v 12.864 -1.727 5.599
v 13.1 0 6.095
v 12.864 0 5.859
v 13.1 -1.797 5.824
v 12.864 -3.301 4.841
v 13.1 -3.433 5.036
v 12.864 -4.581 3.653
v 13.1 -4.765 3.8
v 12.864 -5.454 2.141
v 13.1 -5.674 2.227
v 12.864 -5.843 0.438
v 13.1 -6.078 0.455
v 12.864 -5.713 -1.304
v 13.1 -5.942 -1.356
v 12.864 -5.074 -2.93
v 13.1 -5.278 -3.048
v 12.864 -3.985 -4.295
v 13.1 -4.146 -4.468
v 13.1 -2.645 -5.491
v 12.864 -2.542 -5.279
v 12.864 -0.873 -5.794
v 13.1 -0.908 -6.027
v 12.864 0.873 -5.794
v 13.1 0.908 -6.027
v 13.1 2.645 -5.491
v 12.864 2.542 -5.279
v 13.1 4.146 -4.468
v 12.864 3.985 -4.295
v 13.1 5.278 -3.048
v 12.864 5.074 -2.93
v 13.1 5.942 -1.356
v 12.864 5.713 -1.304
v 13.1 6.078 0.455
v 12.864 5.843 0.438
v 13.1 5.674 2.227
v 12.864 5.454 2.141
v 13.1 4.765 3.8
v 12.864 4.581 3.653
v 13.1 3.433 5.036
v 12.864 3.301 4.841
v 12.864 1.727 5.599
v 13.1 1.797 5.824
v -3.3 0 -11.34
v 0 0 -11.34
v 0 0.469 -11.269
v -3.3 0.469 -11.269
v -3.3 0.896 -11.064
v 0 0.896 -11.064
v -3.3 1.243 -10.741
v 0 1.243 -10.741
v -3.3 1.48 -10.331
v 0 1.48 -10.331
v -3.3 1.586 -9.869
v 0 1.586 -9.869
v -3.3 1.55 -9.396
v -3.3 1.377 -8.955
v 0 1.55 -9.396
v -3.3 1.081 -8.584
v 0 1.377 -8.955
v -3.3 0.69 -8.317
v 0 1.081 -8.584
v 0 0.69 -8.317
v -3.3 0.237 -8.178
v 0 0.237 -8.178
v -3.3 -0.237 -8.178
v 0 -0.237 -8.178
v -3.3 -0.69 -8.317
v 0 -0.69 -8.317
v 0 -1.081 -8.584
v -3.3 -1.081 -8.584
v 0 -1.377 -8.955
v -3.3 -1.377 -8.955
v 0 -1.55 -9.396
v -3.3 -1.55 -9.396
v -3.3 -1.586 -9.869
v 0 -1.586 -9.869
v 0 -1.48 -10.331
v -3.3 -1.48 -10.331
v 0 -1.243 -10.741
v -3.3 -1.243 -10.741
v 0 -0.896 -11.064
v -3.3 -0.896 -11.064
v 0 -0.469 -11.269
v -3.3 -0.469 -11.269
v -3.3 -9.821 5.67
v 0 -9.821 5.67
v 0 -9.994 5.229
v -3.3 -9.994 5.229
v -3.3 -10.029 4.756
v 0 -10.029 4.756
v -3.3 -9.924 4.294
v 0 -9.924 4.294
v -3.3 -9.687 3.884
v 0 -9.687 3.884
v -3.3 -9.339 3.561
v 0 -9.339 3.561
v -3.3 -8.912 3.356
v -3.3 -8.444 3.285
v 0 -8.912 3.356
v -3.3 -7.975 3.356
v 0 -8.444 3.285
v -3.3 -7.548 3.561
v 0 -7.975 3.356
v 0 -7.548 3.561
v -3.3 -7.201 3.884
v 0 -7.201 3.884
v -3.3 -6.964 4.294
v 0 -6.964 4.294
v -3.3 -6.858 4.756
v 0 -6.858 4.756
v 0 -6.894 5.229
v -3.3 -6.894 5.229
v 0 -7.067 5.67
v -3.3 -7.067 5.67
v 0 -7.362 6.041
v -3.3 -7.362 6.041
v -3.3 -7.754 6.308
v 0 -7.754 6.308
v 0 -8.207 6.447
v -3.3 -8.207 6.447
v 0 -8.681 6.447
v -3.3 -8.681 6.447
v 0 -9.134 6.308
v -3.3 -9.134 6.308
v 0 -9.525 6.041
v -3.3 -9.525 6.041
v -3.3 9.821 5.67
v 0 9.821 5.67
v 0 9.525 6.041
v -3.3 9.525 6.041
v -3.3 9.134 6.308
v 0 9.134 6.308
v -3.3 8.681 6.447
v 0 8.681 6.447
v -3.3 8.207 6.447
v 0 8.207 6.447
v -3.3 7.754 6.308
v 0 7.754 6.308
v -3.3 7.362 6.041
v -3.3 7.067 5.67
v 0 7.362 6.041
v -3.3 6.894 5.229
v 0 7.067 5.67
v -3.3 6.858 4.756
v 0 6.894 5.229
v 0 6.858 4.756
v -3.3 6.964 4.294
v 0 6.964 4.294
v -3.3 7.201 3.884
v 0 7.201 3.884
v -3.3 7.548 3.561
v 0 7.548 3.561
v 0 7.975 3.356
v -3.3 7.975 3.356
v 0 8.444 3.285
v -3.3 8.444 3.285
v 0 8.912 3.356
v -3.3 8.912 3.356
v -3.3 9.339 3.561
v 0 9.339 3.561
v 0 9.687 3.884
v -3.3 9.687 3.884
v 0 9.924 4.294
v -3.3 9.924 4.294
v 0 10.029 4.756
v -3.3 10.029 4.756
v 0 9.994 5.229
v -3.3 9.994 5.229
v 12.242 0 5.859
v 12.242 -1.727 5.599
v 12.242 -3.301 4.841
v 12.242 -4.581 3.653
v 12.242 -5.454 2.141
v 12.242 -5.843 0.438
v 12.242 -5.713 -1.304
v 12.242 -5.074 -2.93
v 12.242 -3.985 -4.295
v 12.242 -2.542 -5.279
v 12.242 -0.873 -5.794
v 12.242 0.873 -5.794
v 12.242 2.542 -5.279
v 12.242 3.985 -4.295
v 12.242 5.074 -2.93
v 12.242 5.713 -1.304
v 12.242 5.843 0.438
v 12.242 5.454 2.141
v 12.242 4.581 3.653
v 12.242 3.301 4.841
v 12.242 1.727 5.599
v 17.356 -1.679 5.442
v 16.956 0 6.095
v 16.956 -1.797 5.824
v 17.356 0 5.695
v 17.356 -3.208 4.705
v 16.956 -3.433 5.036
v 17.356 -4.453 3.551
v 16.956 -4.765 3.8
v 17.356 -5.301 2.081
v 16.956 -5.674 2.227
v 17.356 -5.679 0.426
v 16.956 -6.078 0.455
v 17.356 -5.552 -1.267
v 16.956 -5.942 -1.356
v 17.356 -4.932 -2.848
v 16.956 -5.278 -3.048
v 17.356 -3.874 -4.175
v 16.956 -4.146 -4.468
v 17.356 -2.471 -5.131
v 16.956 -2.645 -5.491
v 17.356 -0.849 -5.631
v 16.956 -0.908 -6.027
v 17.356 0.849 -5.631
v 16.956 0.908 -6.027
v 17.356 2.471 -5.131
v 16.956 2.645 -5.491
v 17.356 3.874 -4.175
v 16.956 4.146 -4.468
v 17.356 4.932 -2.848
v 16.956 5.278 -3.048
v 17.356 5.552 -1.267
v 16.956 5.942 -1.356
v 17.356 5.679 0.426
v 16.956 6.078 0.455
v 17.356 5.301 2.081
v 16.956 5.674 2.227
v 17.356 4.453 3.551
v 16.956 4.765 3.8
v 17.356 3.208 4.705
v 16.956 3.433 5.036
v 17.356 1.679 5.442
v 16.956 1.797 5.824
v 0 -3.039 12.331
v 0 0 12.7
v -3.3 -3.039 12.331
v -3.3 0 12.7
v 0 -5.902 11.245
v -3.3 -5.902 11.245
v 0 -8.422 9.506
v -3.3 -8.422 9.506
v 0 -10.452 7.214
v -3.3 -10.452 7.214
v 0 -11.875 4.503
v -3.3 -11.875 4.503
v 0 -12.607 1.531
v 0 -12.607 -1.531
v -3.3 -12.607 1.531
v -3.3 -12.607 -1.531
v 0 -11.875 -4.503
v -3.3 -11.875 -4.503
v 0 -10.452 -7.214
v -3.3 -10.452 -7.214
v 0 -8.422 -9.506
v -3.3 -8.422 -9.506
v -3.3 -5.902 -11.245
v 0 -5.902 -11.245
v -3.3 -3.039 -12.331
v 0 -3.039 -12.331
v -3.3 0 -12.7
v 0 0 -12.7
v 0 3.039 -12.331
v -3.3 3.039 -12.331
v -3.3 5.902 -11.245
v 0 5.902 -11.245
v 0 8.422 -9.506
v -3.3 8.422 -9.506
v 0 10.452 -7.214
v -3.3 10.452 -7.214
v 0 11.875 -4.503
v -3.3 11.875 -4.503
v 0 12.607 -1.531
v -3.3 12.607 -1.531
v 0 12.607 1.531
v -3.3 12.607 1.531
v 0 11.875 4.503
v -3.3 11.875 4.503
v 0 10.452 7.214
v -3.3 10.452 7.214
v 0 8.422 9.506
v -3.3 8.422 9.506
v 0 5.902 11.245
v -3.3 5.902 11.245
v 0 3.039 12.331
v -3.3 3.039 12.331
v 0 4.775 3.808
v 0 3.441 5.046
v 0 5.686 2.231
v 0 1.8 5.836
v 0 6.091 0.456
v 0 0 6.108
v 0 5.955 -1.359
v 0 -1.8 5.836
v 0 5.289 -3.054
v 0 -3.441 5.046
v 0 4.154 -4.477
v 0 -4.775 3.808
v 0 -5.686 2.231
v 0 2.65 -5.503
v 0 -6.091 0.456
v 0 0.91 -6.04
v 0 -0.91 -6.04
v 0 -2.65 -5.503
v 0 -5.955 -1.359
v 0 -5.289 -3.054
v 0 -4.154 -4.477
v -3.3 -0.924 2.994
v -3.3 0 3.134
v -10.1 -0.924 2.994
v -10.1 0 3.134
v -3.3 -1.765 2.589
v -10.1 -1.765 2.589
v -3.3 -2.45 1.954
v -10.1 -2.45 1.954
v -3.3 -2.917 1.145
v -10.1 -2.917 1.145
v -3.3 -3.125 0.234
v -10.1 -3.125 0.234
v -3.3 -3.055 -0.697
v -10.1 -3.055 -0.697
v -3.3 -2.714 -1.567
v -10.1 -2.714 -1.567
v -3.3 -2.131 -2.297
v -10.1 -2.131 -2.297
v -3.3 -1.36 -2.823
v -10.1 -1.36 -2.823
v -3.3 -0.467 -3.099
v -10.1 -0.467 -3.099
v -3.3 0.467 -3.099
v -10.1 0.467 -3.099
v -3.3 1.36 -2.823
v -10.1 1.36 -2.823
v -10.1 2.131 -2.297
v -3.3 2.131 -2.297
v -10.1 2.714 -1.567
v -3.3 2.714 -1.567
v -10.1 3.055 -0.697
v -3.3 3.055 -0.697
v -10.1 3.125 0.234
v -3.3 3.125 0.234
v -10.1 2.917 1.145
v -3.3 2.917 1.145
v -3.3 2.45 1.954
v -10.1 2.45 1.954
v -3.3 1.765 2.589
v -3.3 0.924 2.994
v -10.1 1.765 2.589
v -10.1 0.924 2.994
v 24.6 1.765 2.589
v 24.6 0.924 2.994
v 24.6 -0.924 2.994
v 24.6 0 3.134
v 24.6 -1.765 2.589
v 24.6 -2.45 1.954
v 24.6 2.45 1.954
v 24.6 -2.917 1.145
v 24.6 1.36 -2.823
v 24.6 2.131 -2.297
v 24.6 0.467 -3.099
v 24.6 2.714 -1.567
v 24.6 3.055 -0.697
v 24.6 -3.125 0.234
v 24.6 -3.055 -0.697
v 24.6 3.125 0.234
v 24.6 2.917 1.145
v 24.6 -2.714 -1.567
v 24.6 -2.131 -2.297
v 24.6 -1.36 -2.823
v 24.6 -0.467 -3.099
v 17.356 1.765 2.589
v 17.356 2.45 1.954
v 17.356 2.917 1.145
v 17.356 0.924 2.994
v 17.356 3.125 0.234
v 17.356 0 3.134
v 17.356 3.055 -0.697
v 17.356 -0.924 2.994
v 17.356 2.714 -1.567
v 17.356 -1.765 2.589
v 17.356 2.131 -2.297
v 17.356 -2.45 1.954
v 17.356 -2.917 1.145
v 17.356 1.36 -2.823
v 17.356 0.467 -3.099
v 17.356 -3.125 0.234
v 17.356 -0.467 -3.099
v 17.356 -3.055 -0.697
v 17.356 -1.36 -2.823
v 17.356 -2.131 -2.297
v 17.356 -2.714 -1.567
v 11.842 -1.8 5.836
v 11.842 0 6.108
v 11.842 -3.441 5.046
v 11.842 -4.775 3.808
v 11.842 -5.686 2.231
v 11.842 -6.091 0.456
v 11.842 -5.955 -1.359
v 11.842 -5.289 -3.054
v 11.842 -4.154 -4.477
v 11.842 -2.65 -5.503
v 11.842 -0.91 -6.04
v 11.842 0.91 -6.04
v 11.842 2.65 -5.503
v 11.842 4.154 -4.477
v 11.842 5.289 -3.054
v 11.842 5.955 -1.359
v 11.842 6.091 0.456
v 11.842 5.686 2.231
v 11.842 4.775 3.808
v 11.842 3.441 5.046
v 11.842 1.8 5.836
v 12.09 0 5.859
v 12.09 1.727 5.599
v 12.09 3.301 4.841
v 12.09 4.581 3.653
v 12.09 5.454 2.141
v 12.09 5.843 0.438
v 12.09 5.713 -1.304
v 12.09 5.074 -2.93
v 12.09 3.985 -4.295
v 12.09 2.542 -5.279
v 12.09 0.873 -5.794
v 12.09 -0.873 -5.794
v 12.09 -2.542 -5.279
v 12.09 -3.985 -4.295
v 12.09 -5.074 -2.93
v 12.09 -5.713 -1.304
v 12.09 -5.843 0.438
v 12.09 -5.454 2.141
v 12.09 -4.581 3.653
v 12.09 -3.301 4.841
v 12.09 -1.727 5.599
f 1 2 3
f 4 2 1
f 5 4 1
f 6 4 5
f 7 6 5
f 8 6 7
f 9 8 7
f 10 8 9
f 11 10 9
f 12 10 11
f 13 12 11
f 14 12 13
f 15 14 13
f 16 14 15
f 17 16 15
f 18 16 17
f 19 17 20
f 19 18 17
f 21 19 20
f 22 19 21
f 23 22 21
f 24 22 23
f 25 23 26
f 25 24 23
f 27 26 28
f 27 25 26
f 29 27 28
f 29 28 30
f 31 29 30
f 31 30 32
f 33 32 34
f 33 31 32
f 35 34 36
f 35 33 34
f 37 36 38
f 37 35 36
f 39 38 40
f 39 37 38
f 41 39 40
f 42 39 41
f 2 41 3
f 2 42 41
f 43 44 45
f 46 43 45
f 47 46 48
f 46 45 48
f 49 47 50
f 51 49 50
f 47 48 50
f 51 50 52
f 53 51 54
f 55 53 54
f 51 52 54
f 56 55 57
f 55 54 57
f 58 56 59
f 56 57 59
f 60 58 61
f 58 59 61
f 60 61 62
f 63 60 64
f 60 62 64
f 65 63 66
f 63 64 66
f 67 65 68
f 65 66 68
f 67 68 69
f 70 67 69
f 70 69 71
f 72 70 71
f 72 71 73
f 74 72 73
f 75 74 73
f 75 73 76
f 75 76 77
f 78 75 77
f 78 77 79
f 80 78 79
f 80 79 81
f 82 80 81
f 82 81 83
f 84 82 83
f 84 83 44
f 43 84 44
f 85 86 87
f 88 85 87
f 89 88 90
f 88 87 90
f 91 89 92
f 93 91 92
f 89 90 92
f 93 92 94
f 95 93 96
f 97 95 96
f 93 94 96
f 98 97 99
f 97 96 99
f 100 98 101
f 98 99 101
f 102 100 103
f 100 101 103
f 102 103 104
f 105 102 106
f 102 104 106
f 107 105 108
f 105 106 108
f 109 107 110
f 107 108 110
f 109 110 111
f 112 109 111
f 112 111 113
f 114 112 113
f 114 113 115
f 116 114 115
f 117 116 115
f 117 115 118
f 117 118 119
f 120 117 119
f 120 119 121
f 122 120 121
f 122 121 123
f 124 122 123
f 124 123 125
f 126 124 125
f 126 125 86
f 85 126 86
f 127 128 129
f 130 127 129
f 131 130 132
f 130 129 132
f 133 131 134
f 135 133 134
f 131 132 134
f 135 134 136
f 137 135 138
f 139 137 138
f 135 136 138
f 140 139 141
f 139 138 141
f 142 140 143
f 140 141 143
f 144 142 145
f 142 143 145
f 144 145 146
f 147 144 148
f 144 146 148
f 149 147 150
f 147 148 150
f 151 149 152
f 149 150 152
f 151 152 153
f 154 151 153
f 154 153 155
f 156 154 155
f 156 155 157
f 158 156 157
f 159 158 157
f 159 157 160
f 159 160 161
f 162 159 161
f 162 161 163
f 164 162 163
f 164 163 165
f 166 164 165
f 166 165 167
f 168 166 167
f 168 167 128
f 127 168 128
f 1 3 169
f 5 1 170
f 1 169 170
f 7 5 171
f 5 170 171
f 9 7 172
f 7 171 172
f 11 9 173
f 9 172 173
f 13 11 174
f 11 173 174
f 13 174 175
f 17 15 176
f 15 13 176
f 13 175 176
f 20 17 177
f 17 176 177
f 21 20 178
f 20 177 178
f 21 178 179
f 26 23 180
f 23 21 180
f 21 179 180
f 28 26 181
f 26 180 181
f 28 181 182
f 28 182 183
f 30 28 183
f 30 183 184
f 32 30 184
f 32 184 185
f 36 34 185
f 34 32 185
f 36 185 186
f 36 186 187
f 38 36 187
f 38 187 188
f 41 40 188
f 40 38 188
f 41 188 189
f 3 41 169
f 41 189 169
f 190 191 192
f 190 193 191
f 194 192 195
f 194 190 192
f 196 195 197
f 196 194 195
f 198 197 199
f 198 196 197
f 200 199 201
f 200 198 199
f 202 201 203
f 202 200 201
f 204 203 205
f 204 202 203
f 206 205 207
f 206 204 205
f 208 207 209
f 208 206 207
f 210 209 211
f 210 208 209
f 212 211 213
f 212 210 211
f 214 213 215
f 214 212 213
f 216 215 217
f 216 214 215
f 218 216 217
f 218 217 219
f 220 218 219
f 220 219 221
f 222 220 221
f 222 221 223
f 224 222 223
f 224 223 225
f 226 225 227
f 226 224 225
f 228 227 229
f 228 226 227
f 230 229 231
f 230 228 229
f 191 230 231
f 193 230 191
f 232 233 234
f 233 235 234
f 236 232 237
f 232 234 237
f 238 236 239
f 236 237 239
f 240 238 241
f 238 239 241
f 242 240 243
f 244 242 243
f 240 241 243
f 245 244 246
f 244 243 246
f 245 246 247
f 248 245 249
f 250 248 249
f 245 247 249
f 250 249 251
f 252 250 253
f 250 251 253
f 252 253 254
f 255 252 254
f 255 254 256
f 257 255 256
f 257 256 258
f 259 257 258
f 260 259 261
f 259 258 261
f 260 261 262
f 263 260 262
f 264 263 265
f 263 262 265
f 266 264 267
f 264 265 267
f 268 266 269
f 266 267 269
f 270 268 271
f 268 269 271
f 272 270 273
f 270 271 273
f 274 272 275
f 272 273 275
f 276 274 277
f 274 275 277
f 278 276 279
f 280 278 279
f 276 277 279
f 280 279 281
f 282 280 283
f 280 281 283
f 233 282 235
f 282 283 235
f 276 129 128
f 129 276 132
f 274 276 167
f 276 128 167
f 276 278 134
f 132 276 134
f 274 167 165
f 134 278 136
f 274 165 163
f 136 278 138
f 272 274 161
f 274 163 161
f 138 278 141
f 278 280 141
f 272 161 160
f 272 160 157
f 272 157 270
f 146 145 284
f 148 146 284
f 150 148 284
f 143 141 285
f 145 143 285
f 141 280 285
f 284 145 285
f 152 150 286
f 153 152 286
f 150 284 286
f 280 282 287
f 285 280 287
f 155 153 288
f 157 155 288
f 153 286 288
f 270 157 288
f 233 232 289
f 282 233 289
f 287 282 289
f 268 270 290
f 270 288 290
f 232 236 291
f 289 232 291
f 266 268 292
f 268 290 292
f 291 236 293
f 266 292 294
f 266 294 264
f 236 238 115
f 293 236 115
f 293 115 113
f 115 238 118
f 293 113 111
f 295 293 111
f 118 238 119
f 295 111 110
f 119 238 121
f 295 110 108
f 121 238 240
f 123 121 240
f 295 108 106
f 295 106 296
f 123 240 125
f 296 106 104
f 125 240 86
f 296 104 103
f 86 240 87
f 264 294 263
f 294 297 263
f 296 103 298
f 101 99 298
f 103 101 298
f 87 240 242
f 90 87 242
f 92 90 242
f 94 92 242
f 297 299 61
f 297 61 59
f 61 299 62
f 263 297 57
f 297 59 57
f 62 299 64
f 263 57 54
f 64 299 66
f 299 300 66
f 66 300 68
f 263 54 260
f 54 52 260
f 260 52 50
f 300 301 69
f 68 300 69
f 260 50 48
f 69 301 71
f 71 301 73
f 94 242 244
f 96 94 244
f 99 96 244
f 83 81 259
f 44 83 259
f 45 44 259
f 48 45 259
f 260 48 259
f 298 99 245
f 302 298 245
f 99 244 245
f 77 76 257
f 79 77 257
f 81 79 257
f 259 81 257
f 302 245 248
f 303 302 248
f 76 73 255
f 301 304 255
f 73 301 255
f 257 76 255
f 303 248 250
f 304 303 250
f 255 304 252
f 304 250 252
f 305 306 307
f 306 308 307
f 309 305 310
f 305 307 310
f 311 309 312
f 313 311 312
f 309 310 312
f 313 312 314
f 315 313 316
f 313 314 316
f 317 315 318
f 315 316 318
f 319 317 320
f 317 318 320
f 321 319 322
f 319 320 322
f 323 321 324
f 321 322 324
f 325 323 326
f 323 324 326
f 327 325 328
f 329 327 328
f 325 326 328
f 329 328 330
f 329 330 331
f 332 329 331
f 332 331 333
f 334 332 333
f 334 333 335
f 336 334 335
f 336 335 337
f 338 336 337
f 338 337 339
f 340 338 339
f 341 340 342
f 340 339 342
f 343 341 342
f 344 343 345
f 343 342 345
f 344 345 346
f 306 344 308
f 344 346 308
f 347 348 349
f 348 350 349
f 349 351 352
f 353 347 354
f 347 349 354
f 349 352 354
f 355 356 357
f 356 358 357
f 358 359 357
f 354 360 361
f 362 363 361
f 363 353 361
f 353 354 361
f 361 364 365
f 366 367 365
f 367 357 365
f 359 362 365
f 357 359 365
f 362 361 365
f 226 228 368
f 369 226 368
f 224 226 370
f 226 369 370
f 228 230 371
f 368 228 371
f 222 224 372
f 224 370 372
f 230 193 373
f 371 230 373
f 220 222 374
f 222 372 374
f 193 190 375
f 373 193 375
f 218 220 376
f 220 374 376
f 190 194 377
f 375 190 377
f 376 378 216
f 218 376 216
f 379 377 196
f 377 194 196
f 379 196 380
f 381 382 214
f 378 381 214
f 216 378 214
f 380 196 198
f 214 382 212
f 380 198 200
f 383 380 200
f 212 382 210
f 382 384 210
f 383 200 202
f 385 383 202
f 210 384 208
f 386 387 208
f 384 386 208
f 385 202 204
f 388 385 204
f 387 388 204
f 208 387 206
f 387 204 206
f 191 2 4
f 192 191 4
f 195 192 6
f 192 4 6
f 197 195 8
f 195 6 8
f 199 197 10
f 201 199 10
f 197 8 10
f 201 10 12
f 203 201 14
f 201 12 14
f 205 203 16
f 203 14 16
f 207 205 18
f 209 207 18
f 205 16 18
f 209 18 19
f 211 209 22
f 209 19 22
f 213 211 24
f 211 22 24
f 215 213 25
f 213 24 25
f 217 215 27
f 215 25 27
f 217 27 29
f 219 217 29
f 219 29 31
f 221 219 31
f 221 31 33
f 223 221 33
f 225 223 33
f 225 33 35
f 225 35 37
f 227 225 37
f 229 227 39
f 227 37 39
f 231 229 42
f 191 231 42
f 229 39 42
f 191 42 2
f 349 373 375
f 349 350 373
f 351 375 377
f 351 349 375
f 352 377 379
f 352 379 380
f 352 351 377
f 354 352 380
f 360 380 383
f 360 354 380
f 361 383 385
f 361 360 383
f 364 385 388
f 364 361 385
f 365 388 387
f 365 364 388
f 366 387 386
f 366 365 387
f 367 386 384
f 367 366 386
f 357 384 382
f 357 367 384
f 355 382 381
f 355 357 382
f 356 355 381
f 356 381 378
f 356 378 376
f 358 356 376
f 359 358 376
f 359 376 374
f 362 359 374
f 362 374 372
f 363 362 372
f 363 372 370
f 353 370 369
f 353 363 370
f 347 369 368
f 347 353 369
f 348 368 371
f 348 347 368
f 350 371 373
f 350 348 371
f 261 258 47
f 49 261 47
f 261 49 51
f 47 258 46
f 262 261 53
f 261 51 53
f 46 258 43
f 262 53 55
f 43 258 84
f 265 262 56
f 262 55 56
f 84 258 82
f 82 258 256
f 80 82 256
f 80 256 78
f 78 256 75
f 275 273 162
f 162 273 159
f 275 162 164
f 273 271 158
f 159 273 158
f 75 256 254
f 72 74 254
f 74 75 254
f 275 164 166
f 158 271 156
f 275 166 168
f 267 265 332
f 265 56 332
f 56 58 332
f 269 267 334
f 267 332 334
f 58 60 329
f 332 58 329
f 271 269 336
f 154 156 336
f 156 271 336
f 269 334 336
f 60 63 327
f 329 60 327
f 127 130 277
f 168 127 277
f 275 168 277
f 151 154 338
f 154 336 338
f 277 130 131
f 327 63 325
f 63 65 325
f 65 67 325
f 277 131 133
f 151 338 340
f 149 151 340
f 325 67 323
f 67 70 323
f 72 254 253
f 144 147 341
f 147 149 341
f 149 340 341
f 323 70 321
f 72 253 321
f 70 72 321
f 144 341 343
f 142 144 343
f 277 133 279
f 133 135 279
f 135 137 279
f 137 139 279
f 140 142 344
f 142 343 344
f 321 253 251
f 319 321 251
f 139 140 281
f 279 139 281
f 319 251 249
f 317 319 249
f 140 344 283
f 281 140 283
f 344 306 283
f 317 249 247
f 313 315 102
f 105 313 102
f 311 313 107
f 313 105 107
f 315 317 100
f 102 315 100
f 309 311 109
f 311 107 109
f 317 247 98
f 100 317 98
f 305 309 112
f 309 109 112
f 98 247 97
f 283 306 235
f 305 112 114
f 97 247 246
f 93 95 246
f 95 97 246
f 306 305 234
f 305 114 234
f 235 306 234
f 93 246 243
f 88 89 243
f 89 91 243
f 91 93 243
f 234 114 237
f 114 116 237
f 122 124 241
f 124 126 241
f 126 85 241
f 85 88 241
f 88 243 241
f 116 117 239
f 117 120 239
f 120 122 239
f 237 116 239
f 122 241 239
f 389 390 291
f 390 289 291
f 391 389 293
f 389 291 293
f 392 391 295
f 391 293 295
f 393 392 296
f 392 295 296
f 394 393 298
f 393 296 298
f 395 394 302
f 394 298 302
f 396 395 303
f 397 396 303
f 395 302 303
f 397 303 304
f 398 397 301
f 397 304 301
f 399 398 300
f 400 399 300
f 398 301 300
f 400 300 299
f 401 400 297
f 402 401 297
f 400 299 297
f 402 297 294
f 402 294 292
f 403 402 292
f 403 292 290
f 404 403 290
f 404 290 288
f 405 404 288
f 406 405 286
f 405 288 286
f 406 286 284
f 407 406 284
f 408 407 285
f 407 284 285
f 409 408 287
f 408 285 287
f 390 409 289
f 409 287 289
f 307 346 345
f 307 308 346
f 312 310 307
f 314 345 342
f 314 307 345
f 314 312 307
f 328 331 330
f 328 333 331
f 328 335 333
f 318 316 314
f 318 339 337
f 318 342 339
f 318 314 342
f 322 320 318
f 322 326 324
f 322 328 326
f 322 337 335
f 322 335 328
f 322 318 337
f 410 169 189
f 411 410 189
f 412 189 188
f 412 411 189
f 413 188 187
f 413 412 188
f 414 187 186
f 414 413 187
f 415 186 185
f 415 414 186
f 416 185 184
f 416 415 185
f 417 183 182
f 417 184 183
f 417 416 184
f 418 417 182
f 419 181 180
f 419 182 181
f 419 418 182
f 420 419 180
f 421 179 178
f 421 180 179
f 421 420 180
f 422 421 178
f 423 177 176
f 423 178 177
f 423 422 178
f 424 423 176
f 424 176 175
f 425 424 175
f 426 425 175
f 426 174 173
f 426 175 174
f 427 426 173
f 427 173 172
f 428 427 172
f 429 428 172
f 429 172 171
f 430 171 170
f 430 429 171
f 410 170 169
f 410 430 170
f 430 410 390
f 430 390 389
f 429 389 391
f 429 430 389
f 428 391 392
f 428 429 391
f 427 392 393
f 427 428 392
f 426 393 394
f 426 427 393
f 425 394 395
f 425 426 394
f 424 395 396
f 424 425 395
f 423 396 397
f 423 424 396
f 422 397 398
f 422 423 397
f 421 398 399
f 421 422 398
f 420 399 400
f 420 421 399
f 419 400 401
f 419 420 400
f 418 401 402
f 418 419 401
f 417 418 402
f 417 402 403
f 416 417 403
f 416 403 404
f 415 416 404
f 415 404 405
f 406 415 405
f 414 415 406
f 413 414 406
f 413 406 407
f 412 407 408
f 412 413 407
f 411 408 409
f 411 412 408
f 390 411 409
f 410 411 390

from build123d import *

# Parameters (mm, degrees)
SKETCH1_W          = 6.8
SKETCH1_H          = 3.133597909
SKETCH1_W_2        = 20.655905863
SKETCH1_W_3        = 7.244094137
SKETCH2_R          = 1.59
CUT_EXTRUDE1_DEPTH = 10
CIRPATTERN1_COUNT  = 3
CHAMFER1_SIZE      = 0.4


with BuildPart() as part:
    # Sketch1 → Revolve1 (revolve)
    with BuildSketch(Plane.XY, mode=Mode.PRIVATE) as revolve1_sk:
        with Locations((-6.7, 1.566798955)):
            Rectangle(SKETCH1_W, SKETCH1_H)
        with Locations((7.027952931, 1.566798955)):
            Rectangle(SKETCH1_W_2, SKETCH1_H)
        Polygon((17.355905863, 3.133597909), (17.355905863, 6.095), (12.7, 6.095), (12.7, 5.859469346), (12.242129105, 5.859469346), (12.242129105, 6.107765985), (0, 6.107765985), (0, 12.7), (-3.3, 12.7), (-3.3, 3.133597909), align=None)
        with Locations((20.977952931, 1.566798955)):
            Rectangle(SKETCH1_W_3, SKETCH1_H)
    revolve(revolve1_sk.sketch.rotate(Axis((-3.3, 0, 0), (1, 0, 0)), 90), axis=Axis((-3.3, 0, 0), (1, 0, 0)))

    # Sketch2 → Cut-Extrude1 (cut)
    with BuildSketch(Plane(origin=(0, 0, 0), x_dir=(0, 0, -1), z_dir=(1, 0, 0))):
        with Locations((9.75, 0)):
            Circle(SKETCH2_R)
    cut_extrude1 = extrude(amount=-CUT_EXTRUDE1_DEPTH, mode=Mode.SUBTRACT)

    # CirPattern1: Cut-Extrude1 ×3 about axis
    cirpattern1_axis = Axis((0, 0, 0), (1, 0, 0))
    for i in range(1, CIRPATTERN1_COUNT):
        add(cut_extrude1.rotate(cirpattern1_axis, i * 360 / CIRPATTERN1_COUNT), mode=Mode.SUBTRACT)

    # Chamfer1
    # the kernel refuses this chamfer: 0.4 mm, written as the material it takes off along each edge
    with BuildSketch(Plane(origin=(17.355905863, 0, 0), x_dir=(0, 0, 1), z_dir=(0, 1, 0))) as chamfer1_piece_1:
        Polygon((6.095, -CHAMFER1_SIZE), (6.095 - CHAMFER1_SIZE, 0), (6.095, 0), align=None)
    revolve(axis=Axis((17.355905863, 0, 0), (1, 0, 0)), mode=Mode.SUBTRACT)
    with BuildSketch(Plane(origin=(12.7, 0, 0), x_dir=(0, 0, 1), z_dir=(0, 1, 0))) as chamfer1_piece_2_section:
        Polygon((6.095 - CHAMFER1_SIZE, 0), (6.095, CHAMFER1_SIZE), (6.095, 0), align=None)
    chamfer1_piece_2 = revolve(axis=Axis((12.7, 0, 0), (1, 0, 0)), mode=Mode.PRIVATE)
    chamfer1_piece_2 = chamfer1_piece_2 - Plane(origin=(12.978018591, 0, 0), x_dir=(0, 0, 1), z_dir=(-1, 0, 0)) * Cylinder(5.859469346, 25, mode=Mode.PRIVATE)
    add(chamfer1_piece_2, mode=Mode.SUBTRACT)
    with BuildSketch(Plane(origin=(12.242129105, 0, 0), x_dir=(0, 0, 1), z_dir=(0, 1, 0))) as chamfer1_piece_3_section:
        Polygon((6.107765985, -CHAMFER1_SIZE), (6.107765985 - CHAMFER1_SIZE, 0), (6.107765985, 0), align=None)
    chamfer1_piece_3 = revolve(axis=Axis((12.242129105, 0, 0), (1, 0, 0)), mode=Mode.PRIVATE)
    chamfer1_piece_3 = chamfer1_piece_3 - Plane(origin=(11.970594619, 0, 0), x_dir=(0, 0, 1), z_dir=(-1, 0, 0)) * Cylinder(5.859469346, 25, mode=Mode.PRIVATE)
    add(chamfer1_piece_3, mode=Mode.SUBTRACT)


solid = part.part
